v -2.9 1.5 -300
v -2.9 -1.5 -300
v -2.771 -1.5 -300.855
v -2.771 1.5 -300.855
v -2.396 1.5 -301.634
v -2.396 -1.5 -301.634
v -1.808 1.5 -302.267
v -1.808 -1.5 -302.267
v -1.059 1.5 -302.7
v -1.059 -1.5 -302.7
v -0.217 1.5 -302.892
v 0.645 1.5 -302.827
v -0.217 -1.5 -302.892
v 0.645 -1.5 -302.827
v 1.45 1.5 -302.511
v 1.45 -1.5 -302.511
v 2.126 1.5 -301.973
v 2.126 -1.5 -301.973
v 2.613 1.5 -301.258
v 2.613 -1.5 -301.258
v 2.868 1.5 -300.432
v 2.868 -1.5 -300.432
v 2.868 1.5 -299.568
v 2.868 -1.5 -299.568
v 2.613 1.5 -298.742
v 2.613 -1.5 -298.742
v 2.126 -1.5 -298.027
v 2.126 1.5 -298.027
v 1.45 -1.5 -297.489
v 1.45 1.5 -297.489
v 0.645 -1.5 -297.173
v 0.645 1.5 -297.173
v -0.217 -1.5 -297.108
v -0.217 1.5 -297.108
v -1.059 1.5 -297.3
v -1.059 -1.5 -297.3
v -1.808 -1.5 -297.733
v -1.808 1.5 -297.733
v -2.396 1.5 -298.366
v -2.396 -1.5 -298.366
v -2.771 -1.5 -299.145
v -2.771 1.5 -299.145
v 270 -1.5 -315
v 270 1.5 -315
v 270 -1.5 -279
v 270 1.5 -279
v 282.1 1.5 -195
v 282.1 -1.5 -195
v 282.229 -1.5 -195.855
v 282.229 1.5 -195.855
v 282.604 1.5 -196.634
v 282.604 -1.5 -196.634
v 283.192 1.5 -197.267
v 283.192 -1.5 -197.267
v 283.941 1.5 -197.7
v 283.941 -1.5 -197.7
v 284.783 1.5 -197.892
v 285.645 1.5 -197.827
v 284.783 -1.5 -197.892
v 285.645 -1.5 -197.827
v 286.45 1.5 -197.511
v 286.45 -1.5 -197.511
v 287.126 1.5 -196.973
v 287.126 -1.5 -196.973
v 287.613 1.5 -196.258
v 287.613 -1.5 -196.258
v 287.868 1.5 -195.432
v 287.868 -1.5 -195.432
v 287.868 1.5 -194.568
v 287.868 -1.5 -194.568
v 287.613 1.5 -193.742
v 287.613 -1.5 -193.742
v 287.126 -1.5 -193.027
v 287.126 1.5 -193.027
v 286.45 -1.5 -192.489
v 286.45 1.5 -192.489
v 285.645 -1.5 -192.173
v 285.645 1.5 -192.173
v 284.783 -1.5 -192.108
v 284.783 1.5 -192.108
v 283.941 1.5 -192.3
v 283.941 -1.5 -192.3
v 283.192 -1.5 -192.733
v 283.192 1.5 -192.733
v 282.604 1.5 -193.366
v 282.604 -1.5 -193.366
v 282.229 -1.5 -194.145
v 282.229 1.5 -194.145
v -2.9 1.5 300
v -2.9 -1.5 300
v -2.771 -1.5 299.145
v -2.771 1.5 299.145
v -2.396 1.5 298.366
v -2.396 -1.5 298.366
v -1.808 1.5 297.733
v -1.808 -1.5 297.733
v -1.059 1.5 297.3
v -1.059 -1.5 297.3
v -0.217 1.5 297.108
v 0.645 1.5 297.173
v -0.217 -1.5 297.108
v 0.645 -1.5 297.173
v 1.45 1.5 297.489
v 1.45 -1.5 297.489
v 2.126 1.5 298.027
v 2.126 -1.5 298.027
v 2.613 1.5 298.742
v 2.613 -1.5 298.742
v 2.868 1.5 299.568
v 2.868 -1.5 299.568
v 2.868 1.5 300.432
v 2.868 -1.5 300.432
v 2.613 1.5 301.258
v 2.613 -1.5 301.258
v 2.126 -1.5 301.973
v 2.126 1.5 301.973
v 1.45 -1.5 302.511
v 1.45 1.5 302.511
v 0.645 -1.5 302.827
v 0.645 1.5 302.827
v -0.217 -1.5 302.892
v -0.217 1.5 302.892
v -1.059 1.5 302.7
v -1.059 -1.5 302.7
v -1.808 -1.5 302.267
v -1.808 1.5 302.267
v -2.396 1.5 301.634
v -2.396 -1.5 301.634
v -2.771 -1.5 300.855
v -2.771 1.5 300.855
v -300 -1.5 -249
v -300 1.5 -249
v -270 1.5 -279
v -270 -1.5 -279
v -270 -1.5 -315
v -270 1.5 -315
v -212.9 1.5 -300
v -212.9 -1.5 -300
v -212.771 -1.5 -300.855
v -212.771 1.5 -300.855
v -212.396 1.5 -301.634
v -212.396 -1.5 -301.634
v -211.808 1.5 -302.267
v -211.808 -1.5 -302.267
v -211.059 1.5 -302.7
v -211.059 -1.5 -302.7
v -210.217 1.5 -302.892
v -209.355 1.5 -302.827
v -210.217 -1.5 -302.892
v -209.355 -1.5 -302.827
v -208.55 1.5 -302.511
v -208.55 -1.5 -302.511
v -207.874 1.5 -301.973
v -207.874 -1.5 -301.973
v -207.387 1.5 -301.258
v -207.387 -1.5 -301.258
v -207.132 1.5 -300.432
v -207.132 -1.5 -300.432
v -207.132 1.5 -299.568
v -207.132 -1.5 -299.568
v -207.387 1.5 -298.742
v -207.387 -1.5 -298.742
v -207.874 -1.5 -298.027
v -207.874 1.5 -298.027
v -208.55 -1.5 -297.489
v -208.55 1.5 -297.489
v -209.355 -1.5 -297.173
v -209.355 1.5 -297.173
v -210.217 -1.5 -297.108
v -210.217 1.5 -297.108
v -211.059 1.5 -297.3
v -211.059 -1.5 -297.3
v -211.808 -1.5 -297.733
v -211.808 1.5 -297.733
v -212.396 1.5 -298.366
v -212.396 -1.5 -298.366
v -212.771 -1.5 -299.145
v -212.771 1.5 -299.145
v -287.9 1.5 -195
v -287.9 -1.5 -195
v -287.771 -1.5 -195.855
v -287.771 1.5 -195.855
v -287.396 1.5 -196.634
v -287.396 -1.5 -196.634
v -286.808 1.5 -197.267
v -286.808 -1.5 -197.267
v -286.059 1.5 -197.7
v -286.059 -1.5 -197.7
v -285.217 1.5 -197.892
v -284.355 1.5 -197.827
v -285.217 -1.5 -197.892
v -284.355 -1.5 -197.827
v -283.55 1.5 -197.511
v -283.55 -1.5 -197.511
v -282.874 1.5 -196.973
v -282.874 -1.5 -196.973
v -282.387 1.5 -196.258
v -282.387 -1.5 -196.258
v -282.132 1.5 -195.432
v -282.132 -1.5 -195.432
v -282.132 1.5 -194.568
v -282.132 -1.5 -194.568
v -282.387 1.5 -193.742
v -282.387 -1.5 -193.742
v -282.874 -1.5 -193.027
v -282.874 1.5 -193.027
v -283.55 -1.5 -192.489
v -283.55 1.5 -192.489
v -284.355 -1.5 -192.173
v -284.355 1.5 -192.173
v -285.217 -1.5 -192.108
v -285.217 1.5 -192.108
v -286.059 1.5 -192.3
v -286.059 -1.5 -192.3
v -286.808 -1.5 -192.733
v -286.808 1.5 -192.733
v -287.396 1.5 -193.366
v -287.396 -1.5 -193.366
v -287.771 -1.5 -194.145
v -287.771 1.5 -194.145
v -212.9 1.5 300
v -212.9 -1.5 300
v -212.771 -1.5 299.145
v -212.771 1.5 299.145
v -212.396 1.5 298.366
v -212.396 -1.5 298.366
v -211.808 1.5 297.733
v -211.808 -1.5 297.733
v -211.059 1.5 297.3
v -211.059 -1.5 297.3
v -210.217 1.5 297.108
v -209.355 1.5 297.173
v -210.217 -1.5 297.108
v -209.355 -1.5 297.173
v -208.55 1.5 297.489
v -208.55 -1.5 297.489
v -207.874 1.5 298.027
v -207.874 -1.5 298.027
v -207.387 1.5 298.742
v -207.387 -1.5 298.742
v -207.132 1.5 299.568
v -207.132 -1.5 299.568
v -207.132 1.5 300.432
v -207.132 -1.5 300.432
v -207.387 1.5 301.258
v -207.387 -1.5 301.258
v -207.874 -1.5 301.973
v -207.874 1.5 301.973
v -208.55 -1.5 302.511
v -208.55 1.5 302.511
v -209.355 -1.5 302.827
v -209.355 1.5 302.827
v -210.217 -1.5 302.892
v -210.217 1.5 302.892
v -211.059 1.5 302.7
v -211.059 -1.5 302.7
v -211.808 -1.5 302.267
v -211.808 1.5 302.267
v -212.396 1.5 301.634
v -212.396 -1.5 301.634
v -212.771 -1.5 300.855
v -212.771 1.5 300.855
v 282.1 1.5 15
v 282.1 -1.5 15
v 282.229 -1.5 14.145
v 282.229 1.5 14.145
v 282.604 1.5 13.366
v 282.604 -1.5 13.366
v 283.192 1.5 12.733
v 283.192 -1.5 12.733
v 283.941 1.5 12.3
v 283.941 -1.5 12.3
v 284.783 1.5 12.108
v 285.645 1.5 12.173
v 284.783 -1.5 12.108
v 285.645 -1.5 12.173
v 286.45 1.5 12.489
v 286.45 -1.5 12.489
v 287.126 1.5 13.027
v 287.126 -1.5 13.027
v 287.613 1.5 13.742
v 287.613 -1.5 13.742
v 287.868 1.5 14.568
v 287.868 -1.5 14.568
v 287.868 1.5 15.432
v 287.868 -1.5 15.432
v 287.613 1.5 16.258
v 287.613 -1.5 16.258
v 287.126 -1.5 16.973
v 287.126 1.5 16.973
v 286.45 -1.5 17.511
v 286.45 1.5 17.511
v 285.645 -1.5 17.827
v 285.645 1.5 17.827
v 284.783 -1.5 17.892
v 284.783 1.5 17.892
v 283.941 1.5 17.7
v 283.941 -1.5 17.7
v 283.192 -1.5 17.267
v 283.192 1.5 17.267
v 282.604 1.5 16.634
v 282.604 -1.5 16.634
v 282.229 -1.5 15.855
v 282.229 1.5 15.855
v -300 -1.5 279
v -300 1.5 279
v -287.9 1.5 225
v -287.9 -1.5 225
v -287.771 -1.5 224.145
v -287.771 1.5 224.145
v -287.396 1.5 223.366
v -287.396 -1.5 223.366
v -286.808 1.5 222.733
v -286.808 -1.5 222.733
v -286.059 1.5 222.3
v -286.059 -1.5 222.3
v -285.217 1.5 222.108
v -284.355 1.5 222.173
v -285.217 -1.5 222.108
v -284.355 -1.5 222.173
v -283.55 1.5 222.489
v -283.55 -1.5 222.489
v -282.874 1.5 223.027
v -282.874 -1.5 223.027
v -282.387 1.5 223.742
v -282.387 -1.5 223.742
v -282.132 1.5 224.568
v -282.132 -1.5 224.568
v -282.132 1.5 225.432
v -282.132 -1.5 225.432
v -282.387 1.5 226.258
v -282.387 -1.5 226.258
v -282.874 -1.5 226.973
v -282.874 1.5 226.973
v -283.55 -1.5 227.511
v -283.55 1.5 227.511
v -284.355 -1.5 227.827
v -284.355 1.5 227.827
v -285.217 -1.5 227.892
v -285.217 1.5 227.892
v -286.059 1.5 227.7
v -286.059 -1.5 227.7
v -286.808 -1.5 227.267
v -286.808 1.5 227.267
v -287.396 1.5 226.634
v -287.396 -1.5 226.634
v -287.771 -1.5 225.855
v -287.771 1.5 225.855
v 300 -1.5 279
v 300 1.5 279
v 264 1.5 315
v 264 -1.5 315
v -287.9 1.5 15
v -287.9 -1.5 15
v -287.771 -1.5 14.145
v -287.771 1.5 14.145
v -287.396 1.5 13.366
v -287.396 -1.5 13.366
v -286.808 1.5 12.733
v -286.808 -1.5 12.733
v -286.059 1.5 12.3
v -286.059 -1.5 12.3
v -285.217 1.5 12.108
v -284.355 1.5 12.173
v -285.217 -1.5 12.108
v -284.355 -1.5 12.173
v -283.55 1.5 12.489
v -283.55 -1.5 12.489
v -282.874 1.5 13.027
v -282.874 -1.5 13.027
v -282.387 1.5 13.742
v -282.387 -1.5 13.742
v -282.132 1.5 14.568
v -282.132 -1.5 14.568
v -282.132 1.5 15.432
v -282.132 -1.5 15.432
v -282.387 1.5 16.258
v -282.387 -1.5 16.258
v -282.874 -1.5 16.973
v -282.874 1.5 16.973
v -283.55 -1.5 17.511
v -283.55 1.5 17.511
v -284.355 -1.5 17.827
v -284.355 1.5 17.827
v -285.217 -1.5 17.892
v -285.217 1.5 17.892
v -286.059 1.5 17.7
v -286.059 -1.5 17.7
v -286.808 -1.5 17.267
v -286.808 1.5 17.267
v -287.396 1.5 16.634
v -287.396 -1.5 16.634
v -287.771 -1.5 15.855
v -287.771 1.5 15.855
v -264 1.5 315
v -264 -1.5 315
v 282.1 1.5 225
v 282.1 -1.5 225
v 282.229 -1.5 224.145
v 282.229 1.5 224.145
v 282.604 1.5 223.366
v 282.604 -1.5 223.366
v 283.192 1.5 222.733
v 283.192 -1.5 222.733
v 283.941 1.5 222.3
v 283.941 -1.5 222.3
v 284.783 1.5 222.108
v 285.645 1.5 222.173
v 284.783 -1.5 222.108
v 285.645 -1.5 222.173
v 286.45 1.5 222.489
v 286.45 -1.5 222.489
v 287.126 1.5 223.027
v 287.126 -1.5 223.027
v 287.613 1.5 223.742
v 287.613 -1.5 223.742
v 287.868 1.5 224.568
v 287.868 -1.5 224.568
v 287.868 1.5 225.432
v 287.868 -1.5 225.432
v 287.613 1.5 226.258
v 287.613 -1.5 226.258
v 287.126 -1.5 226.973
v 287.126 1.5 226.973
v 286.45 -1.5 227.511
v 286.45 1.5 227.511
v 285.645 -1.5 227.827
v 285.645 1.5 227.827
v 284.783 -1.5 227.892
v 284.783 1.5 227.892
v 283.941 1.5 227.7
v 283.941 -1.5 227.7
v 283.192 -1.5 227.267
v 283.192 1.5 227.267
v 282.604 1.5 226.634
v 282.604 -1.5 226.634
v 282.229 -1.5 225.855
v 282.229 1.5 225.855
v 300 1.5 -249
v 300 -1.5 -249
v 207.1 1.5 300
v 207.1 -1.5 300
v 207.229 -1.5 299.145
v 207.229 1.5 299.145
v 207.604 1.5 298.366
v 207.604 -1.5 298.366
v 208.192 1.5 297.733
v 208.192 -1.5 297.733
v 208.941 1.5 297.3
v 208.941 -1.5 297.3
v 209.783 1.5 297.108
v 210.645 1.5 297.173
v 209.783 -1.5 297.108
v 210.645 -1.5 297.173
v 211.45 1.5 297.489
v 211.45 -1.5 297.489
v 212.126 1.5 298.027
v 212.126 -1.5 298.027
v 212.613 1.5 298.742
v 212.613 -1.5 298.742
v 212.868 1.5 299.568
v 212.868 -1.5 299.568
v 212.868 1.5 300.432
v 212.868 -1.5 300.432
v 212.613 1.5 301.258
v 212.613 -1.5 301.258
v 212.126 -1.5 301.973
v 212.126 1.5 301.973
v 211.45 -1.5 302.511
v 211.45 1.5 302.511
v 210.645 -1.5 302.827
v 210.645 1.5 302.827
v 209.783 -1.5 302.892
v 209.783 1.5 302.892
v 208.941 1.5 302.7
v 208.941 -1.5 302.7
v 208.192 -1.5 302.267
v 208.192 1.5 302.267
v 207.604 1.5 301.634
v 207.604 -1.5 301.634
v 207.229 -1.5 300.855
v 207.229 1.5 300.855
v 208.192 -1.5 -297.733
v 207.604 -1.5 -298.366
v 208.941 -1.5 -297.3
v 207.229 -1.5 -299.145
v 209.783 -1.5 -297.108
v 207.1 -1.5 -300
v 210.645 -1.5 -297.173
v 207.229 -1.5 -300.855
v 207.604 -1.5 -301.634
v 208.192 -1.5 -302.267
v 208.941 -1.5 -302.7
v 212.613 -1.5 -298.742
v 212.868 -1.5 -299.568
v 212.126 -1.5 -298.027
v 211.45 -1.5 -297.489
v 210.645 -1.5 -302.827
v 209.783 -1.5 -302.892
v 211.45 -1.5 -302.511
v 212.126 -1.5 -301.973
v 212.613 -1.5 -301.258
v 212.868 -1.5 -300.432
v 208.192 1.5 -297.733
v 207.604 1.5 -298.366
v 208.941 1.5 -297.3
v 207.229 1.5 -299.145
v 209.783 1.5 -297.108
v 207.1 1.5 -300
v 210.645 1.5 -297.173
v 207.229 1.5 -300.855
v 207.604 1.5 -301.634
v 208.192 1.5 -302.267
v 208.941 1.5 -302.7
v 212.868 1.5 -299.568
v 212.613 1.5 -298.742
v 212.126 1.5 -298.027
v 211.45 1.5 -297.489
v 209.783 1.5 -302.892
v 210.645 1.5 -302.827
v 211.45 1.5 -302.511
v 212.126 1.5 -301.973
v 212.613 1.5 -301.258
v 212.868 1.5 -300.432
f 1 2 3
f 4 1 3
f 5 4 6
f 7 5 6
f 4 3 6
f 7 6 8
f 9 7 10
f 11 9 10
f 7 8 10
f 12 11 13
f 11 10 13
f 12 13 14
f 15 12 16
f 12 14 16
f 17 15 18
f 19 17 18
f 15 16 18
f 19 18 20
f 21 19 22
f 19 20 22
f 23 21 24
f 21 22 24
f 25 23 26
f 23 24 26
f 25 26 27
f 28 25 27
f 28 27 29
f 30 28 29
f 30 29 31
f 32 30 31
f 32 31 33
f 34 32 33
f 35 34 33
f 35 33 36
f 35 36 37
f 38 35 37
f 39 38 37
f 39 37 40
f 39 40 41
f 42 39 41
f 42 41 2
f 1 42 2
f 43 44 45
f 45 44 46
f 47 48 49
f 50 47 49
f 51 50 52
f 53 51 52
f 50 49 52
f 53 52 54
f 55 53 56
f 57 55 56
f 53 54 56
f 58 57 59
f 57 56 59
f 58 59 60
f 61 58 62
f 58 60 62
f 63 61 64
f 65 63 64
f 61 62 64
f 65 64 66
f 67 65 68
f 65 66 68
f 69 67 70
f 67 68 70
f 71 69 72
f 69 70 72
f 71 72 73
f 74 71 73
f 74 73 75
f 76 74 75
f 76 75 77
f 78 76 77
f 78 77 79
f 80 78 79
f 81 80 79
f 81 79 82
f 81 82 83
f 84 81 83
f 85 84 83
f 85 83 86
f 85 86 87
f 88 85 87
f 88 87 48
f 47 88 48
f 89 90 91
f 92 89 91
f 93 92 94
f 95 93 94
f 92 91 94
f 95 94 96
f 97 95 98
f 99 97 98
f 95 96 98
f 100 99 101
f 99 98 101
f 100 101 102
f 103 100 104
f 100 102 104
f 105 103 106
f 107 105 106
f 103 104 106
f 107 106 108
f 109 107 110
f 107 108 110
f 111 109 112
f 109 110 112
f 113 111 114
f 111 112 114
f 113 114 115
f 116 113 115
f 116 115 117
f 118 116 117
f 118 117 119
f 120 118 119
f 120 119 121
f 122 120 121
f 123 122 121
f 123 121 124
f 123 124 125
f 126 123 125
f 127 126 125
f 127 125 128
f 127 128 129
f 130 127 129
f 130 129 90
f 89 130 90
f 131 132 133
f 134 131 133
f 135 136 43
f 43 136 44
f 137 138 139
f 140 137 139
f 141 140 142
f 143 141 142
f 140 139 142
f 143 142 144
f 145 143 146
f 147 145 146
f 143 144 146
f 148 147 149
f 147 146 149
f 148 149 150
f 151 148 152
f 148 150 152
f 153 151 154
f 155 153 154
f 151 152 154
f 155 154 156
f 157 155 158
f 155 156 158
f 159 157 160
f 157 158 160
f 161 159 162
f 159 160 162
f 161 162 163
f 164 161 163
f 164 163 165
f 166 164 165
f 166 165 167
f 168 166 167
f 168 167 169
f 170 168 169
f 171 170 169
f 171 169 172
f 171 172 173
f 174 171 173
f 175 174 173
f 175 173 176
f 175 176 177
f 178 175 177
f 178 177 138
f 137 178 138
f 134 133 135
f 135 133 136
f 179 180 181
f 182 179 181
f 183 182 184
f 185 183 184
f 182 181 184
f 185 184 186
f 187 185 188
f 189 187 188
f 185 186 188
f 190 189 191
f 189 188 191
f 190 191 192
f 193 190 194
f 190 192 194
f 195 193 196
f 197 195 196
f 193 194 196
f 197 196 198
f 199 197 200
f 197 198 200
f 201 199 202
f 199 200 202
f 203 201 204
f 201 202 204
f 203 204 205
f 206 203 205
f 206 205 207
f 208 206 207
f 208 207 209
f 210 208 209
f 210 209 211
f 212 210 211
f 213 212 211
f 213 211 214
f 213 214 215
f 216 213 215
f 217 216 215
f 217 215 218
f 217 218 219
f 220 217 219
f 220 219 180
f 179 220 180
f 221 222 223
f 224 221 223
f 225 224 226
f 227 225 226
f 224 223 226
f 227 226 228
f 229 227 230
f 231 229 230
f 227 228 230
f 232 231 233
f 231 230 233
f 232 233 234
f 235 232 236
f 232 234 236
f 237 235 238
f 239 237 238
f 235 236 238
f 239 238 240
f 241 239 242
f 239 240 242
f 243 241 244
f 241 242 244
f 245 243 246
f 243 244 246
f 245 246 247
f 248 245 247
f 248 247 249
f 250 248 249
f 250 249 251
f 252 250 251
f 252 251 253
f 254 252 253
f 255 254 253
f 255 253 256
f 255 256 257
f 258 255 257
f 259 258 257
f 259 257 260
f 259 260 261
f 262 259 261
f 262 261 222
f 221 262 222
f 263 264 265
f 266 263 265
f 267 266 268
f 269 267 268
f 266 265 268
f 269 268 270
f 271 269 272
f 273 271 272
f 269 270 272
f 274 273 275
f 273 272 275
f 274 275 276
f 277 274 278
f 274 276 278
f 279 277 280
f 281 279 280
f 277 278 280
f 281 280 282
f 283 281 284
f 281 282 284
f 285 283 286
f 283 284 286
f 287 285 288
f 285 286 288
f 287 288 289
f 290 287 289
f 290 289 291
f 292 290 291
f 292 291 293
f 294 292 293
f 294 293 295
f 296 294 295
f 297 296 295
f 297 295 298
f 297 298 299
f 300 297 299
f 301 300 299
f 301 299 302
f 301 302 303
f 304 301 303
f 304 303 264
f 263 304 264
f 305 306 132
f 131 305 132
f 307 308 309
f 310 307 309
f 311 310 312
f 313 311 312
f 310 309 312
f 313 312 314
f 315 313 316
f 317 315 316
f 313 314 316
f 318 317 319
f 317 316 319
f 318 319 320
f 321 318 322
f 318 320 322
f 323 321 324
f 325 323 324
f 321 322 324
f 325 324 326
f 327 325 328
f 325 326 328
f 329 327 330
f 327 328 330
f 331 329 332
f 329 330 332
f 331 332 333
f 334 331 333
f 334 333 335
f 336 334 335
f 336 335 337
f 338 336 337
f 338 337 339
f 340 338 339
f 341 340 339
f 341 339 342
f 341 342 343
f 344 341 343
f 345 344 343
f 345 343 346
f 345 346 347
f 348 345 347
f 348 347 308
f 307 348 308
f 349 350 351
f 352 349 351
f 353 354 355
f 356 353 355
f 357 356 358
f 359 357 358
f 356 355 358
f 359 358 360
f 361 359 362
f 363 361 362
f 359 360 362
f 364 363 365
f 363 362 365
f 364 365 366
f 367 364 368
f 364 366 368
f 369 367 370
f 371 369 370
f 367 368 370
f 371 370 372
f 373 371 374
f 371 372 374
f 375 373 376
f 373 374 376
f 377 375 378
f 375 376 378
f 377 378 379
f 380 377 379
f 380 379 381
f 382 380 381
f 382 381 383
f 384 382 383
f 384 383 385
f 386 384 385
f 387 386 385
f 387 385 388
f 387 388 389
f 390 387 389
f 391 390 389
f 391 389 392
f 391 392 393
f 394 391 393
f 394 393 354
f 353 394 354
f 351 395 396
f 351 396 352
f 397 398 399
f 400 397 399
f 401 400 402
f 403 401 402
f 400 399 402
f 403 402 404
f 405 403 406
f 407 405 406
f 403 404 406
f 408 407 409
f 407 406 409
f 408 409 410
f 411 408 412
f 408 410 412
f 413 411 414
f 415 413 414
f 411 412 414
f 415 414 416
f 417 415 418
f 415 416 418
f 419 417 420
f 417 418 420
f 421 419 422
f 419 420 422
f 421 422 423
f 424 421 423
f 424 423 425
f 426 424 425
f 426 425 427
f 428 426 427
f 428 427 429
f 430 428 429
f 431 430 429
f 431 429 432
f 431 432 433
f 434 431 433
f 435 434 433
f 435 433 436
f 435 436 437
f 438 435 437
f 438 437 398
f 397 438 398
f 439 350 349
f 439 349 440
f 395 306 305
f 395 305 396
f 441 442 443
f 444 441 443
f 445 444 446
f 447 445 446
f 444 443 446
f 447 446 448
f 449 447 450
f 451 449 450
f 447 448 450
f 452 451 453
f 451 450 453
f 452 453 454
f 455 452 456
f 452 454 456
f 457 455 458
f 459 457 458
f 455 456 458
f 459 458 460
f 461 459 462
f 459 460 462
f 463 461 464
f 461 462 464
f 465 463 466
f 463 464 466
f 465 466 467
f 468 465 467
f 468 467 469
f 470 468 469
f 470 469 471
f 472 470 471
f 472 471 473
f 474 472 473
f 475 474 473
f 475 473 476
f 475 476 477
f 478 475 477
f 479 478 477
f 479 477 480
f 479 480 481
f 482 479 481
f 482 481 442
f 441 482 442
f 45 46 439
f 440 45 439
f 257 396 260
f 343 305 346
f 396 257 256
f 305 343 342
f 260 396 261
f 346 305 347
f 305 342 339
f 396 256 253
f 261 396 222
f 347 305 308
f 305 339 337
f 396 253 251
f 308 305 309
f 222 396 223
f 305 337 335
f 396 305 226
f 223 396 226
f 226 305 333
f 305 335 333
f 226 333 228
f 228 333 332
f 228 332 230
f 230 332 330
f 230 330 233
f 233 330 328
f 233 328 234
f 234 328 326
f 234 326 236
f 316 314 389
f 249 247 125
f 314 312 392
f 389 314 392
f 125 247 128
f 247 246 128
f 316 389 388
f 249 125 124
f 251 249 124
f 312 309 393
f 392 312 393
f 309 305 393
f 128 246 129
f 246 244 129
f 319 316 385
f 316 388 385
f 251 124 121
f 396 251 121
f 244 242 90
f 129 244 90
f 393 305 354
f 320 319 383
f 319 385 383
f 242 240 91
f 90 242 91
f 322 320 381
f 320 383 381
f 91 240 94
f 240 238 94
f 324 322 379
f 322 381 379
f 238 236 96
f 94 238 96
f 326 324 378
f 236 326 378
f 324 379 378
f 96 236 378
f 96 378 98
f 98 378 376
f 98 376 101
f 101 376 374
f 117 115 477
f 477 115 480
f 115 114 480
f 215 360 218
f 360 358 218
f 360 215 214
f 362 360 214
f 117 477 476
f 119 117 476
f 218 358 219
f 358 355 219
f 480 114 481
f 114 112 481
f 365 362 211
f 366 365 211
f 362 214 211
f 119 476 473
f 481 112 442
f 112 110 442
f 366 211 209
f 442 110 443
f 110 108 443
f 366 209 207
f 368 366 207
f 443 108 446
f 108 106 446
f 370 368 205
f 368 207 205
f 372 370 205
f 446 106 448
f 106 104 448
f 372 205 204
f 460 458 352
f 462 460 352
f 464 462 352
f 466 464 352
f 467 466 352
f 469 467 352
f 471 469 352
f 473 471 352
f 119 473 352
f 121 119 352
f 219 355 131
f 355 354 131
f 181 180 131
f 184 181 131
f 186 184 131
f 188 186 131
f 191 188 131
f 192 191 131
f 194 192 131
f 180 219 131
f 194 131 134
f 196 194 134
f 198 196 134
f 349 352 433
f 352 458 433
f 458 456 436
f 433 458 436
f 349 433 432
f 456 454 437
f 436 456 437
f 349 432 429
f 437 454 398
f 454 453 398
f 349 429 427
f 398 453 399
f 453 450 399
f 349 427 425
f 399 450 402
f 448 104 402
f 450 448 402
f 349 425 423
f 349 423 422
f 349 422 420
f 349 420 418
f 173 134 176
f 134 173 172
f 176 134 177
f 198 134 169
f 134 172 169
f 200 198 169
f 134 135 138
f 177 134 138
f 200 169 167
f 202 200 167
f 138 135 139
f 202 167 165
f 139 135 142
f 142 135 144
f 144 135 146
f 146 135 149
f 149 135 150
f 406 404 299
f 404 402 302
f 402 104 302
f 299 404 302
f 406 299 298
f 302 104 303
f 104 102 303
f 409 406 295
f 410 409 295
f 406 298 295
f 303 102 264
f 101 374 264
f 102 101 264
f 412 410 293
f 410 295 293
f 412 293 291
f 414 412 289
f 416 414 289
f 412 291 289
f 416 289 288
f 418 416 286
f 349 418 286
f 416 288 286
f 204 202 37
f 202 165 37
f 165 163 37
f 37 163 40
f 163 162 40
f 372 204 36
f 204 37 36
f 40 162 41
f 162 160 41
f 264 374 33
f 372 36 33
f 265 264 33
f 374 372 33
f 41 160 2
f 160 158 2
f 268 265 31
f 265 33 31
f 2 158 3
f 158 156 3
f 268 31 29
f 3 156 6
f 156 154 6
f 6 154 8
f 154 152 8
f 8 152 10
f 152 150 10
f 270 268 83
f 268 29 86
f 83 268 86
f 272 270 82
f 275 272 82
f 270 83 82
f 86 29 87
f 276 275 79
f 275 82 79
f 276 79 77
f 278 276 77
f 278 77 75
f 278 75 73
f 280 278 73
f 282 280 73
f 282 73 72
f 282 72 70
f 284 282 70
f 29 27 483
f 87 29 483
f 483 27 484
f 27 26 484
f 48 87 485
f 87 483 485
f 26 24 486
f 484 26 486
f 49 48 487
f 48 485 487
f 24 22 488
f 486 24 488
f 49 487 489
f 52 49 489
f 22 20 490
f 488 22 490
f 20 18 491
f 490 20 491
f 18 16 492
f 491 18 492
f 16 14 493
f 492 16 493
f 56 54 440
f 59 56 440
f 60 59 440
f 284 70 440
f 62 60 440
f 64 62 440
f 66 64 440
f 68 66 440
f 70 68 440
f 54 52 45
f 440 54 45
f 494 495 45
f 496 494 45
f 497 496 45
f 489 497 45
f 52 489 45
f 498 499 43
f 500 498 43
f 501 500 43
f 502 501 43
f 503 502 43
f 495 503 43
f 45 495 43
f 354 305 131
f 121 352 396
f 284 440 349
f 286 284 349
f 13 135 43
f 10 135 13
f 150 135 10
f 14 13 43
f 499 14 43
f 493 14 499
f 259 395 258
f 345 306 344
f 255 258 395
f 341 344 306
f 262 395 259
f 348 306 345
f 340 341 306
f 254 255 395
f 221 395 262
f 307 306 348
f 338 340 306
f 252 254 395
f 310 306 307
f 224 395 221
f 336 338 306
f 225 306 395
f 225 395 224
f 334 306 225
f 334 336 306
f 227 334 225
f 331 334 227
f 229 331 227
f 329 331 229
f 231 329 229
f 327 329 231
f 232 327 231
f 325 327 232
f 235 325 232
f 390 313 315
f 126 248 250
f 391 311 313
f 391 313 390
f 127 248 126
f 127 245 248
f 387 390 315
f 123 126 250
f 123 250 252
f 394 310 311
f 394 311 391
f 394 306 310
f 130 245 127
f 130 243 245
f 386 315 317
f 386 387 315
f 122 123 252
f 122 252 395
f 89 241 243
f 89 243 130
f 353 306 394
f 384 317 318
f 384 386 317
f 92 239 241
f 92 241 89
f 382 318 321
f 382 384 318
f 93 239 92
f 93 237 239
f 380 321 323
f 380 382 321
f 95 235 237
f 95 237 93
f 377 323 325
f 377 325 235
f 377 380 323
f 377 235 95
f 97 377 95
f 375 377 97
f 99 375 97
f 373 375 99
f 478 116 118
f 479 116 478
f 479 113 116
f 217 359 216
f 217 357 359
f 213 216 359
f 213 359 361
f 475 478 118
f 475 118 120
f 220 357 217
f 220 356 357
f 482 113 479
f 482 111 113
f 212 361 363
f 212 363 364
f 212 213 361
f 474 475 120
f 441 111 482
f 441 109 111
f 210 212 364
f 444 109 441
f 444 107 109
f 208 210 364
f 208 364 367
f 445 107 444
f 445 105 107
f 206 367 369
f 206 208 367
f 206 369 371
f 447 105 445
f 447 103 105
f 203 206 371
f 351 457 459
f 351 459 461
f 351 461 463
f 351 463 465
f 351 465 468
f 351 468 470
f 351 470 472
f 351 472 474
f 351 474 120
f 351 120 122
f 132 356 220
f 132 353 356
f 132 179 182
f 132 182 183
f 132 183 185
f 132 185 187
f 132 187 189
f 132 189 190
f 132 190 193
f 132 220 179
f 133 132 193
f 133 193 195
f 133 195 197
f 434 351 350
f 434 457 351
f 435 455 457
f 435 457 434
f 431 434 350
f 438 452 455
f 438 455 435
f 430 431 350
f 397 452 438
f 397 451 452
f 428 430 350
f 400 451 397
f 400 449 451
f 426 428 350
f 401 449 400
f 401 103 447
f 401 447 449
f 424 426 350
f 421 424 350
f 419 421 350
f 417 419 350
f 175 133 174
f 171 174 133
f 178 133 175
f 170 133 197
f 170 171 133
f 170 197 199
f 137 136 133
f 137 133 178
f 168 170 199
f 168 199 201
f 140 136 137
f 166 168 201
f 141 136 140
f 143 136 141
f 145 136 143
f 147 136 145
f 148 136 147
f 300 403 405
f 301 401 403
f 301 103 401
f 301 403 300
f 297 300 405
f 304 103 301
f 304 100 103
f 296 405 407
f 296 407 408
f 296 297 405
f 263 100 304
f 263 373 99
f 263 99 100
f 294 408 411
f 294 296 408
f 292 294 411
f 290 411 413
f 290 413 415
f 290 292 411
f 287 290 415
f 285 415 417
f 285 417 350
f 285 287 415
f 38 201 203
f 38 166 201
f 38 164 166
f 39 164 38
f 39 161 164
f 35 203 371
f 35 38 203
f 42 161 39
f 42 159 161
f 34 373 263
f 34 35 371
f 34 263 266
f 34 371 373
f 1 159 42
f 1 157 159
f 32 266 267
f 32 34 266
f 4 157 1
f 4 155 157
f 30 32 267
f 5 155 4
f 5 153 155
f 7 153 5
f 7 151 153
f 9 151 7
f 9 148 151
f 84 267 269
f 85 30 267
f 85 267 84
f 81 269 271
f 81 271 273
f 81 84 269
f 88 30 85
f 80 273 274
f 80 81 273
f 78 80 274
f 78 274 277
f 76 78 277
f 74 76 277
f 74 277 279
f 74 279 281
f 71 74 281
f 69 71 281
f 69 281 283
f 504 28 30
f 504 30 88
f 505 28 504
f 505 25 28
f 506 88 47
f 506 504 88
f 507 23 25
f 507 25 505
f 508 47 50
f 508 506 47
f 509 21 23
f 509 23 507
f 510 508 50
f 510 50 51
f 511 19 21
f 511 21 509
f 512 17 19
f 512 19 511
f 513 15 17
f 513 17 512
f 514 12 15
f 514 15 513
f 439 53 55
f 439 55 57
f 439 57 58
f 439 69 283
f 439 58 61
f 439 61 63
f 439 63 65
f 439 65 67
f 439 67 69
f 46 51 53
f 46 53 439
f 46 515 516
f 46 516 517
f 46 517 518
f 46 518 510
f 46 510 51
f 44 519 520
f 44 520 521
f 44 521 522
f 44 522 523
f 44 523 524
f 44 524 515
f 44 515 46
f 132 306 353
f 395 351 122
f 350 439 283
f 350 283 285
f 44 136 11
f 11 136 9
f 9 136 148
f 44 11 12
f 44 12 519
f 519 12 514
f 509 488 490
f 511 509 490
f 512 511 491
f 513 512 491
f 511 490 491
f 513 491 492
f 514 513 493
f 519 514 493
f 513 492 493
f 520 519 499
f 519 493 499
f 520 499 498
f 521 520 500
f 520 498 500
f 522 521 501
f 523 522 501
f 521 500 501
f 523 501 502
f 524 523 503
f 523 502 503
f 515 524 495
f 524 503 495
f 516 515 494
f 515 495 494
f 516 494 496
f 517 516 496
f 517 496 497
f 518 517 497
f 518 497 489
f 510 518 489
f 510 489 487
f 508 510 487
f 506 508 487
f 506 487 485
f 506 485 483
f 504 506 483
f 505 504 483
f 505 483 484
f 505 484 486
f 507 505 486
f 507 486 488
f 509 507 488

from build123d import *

# Parameters (mm, degrees)
SKETCH1_W            = 600
SKETCH1_H            = 630
BOSS_EXTRUDE1_DEPTH  = 1.5
CUT_EXTRUDE1_DEPTH   = 436.010344705
M5_CLEARANCE_HOLE2_D = 5.8


with BuildPart() as part:
    # Sketch1 → Boss-Extrude1 (new, symmetric)
    with BuildSketch(Plane(origin=(0, 0, 0), x_dir=(1, 0, 0), z_dir=(0, 1, 0))):
        Rectangle(SKETCH1_W, SKETCH1_H)
    extrude(amount=BOSS_EXTRUDE1_DEPTH, both=True)

    # Sketch2 → Cut-Extrude1 (cut, through all)
    with BuildSketch(Plane(origin=(0, 1.5, 0), x_dir=(1, 0, 0), z_dir=(0, 1, 0))):
        Polygon((270, 315), (270, 279), (300, 249), (300, 315), align=None)
        Polygon((-270, 315), (-300, 315), (-300, 249), (-270, 279), align=None)
        Polygon((-300, -315), (-300, -279), (-264, -315), align=None)
        Polygon((264, -315), (300, -315), (300, -279), align=None)
    extrude(amount=-CUT_EXTRUDE1_DEPTH, mode=Mode.SUBTRACT)

    # M5 Clearance Hole2 (through all)
    with Locations(Plane(origin=(0, 1.5, 0), x_dir=(1, 0, 0), z_dir=(0, 1, 0))):
        with Locations((-210, 300), (0, 300), (210, 300), (285, 195), (285, -15), (285, -225), (210, -300), (0, -300), (-210, -300), (-285, -225), (-285, -15), (-285, 195)):
            Hole(M5_CLEARANCE_HOLE2_D / 2)


solid = part.part
